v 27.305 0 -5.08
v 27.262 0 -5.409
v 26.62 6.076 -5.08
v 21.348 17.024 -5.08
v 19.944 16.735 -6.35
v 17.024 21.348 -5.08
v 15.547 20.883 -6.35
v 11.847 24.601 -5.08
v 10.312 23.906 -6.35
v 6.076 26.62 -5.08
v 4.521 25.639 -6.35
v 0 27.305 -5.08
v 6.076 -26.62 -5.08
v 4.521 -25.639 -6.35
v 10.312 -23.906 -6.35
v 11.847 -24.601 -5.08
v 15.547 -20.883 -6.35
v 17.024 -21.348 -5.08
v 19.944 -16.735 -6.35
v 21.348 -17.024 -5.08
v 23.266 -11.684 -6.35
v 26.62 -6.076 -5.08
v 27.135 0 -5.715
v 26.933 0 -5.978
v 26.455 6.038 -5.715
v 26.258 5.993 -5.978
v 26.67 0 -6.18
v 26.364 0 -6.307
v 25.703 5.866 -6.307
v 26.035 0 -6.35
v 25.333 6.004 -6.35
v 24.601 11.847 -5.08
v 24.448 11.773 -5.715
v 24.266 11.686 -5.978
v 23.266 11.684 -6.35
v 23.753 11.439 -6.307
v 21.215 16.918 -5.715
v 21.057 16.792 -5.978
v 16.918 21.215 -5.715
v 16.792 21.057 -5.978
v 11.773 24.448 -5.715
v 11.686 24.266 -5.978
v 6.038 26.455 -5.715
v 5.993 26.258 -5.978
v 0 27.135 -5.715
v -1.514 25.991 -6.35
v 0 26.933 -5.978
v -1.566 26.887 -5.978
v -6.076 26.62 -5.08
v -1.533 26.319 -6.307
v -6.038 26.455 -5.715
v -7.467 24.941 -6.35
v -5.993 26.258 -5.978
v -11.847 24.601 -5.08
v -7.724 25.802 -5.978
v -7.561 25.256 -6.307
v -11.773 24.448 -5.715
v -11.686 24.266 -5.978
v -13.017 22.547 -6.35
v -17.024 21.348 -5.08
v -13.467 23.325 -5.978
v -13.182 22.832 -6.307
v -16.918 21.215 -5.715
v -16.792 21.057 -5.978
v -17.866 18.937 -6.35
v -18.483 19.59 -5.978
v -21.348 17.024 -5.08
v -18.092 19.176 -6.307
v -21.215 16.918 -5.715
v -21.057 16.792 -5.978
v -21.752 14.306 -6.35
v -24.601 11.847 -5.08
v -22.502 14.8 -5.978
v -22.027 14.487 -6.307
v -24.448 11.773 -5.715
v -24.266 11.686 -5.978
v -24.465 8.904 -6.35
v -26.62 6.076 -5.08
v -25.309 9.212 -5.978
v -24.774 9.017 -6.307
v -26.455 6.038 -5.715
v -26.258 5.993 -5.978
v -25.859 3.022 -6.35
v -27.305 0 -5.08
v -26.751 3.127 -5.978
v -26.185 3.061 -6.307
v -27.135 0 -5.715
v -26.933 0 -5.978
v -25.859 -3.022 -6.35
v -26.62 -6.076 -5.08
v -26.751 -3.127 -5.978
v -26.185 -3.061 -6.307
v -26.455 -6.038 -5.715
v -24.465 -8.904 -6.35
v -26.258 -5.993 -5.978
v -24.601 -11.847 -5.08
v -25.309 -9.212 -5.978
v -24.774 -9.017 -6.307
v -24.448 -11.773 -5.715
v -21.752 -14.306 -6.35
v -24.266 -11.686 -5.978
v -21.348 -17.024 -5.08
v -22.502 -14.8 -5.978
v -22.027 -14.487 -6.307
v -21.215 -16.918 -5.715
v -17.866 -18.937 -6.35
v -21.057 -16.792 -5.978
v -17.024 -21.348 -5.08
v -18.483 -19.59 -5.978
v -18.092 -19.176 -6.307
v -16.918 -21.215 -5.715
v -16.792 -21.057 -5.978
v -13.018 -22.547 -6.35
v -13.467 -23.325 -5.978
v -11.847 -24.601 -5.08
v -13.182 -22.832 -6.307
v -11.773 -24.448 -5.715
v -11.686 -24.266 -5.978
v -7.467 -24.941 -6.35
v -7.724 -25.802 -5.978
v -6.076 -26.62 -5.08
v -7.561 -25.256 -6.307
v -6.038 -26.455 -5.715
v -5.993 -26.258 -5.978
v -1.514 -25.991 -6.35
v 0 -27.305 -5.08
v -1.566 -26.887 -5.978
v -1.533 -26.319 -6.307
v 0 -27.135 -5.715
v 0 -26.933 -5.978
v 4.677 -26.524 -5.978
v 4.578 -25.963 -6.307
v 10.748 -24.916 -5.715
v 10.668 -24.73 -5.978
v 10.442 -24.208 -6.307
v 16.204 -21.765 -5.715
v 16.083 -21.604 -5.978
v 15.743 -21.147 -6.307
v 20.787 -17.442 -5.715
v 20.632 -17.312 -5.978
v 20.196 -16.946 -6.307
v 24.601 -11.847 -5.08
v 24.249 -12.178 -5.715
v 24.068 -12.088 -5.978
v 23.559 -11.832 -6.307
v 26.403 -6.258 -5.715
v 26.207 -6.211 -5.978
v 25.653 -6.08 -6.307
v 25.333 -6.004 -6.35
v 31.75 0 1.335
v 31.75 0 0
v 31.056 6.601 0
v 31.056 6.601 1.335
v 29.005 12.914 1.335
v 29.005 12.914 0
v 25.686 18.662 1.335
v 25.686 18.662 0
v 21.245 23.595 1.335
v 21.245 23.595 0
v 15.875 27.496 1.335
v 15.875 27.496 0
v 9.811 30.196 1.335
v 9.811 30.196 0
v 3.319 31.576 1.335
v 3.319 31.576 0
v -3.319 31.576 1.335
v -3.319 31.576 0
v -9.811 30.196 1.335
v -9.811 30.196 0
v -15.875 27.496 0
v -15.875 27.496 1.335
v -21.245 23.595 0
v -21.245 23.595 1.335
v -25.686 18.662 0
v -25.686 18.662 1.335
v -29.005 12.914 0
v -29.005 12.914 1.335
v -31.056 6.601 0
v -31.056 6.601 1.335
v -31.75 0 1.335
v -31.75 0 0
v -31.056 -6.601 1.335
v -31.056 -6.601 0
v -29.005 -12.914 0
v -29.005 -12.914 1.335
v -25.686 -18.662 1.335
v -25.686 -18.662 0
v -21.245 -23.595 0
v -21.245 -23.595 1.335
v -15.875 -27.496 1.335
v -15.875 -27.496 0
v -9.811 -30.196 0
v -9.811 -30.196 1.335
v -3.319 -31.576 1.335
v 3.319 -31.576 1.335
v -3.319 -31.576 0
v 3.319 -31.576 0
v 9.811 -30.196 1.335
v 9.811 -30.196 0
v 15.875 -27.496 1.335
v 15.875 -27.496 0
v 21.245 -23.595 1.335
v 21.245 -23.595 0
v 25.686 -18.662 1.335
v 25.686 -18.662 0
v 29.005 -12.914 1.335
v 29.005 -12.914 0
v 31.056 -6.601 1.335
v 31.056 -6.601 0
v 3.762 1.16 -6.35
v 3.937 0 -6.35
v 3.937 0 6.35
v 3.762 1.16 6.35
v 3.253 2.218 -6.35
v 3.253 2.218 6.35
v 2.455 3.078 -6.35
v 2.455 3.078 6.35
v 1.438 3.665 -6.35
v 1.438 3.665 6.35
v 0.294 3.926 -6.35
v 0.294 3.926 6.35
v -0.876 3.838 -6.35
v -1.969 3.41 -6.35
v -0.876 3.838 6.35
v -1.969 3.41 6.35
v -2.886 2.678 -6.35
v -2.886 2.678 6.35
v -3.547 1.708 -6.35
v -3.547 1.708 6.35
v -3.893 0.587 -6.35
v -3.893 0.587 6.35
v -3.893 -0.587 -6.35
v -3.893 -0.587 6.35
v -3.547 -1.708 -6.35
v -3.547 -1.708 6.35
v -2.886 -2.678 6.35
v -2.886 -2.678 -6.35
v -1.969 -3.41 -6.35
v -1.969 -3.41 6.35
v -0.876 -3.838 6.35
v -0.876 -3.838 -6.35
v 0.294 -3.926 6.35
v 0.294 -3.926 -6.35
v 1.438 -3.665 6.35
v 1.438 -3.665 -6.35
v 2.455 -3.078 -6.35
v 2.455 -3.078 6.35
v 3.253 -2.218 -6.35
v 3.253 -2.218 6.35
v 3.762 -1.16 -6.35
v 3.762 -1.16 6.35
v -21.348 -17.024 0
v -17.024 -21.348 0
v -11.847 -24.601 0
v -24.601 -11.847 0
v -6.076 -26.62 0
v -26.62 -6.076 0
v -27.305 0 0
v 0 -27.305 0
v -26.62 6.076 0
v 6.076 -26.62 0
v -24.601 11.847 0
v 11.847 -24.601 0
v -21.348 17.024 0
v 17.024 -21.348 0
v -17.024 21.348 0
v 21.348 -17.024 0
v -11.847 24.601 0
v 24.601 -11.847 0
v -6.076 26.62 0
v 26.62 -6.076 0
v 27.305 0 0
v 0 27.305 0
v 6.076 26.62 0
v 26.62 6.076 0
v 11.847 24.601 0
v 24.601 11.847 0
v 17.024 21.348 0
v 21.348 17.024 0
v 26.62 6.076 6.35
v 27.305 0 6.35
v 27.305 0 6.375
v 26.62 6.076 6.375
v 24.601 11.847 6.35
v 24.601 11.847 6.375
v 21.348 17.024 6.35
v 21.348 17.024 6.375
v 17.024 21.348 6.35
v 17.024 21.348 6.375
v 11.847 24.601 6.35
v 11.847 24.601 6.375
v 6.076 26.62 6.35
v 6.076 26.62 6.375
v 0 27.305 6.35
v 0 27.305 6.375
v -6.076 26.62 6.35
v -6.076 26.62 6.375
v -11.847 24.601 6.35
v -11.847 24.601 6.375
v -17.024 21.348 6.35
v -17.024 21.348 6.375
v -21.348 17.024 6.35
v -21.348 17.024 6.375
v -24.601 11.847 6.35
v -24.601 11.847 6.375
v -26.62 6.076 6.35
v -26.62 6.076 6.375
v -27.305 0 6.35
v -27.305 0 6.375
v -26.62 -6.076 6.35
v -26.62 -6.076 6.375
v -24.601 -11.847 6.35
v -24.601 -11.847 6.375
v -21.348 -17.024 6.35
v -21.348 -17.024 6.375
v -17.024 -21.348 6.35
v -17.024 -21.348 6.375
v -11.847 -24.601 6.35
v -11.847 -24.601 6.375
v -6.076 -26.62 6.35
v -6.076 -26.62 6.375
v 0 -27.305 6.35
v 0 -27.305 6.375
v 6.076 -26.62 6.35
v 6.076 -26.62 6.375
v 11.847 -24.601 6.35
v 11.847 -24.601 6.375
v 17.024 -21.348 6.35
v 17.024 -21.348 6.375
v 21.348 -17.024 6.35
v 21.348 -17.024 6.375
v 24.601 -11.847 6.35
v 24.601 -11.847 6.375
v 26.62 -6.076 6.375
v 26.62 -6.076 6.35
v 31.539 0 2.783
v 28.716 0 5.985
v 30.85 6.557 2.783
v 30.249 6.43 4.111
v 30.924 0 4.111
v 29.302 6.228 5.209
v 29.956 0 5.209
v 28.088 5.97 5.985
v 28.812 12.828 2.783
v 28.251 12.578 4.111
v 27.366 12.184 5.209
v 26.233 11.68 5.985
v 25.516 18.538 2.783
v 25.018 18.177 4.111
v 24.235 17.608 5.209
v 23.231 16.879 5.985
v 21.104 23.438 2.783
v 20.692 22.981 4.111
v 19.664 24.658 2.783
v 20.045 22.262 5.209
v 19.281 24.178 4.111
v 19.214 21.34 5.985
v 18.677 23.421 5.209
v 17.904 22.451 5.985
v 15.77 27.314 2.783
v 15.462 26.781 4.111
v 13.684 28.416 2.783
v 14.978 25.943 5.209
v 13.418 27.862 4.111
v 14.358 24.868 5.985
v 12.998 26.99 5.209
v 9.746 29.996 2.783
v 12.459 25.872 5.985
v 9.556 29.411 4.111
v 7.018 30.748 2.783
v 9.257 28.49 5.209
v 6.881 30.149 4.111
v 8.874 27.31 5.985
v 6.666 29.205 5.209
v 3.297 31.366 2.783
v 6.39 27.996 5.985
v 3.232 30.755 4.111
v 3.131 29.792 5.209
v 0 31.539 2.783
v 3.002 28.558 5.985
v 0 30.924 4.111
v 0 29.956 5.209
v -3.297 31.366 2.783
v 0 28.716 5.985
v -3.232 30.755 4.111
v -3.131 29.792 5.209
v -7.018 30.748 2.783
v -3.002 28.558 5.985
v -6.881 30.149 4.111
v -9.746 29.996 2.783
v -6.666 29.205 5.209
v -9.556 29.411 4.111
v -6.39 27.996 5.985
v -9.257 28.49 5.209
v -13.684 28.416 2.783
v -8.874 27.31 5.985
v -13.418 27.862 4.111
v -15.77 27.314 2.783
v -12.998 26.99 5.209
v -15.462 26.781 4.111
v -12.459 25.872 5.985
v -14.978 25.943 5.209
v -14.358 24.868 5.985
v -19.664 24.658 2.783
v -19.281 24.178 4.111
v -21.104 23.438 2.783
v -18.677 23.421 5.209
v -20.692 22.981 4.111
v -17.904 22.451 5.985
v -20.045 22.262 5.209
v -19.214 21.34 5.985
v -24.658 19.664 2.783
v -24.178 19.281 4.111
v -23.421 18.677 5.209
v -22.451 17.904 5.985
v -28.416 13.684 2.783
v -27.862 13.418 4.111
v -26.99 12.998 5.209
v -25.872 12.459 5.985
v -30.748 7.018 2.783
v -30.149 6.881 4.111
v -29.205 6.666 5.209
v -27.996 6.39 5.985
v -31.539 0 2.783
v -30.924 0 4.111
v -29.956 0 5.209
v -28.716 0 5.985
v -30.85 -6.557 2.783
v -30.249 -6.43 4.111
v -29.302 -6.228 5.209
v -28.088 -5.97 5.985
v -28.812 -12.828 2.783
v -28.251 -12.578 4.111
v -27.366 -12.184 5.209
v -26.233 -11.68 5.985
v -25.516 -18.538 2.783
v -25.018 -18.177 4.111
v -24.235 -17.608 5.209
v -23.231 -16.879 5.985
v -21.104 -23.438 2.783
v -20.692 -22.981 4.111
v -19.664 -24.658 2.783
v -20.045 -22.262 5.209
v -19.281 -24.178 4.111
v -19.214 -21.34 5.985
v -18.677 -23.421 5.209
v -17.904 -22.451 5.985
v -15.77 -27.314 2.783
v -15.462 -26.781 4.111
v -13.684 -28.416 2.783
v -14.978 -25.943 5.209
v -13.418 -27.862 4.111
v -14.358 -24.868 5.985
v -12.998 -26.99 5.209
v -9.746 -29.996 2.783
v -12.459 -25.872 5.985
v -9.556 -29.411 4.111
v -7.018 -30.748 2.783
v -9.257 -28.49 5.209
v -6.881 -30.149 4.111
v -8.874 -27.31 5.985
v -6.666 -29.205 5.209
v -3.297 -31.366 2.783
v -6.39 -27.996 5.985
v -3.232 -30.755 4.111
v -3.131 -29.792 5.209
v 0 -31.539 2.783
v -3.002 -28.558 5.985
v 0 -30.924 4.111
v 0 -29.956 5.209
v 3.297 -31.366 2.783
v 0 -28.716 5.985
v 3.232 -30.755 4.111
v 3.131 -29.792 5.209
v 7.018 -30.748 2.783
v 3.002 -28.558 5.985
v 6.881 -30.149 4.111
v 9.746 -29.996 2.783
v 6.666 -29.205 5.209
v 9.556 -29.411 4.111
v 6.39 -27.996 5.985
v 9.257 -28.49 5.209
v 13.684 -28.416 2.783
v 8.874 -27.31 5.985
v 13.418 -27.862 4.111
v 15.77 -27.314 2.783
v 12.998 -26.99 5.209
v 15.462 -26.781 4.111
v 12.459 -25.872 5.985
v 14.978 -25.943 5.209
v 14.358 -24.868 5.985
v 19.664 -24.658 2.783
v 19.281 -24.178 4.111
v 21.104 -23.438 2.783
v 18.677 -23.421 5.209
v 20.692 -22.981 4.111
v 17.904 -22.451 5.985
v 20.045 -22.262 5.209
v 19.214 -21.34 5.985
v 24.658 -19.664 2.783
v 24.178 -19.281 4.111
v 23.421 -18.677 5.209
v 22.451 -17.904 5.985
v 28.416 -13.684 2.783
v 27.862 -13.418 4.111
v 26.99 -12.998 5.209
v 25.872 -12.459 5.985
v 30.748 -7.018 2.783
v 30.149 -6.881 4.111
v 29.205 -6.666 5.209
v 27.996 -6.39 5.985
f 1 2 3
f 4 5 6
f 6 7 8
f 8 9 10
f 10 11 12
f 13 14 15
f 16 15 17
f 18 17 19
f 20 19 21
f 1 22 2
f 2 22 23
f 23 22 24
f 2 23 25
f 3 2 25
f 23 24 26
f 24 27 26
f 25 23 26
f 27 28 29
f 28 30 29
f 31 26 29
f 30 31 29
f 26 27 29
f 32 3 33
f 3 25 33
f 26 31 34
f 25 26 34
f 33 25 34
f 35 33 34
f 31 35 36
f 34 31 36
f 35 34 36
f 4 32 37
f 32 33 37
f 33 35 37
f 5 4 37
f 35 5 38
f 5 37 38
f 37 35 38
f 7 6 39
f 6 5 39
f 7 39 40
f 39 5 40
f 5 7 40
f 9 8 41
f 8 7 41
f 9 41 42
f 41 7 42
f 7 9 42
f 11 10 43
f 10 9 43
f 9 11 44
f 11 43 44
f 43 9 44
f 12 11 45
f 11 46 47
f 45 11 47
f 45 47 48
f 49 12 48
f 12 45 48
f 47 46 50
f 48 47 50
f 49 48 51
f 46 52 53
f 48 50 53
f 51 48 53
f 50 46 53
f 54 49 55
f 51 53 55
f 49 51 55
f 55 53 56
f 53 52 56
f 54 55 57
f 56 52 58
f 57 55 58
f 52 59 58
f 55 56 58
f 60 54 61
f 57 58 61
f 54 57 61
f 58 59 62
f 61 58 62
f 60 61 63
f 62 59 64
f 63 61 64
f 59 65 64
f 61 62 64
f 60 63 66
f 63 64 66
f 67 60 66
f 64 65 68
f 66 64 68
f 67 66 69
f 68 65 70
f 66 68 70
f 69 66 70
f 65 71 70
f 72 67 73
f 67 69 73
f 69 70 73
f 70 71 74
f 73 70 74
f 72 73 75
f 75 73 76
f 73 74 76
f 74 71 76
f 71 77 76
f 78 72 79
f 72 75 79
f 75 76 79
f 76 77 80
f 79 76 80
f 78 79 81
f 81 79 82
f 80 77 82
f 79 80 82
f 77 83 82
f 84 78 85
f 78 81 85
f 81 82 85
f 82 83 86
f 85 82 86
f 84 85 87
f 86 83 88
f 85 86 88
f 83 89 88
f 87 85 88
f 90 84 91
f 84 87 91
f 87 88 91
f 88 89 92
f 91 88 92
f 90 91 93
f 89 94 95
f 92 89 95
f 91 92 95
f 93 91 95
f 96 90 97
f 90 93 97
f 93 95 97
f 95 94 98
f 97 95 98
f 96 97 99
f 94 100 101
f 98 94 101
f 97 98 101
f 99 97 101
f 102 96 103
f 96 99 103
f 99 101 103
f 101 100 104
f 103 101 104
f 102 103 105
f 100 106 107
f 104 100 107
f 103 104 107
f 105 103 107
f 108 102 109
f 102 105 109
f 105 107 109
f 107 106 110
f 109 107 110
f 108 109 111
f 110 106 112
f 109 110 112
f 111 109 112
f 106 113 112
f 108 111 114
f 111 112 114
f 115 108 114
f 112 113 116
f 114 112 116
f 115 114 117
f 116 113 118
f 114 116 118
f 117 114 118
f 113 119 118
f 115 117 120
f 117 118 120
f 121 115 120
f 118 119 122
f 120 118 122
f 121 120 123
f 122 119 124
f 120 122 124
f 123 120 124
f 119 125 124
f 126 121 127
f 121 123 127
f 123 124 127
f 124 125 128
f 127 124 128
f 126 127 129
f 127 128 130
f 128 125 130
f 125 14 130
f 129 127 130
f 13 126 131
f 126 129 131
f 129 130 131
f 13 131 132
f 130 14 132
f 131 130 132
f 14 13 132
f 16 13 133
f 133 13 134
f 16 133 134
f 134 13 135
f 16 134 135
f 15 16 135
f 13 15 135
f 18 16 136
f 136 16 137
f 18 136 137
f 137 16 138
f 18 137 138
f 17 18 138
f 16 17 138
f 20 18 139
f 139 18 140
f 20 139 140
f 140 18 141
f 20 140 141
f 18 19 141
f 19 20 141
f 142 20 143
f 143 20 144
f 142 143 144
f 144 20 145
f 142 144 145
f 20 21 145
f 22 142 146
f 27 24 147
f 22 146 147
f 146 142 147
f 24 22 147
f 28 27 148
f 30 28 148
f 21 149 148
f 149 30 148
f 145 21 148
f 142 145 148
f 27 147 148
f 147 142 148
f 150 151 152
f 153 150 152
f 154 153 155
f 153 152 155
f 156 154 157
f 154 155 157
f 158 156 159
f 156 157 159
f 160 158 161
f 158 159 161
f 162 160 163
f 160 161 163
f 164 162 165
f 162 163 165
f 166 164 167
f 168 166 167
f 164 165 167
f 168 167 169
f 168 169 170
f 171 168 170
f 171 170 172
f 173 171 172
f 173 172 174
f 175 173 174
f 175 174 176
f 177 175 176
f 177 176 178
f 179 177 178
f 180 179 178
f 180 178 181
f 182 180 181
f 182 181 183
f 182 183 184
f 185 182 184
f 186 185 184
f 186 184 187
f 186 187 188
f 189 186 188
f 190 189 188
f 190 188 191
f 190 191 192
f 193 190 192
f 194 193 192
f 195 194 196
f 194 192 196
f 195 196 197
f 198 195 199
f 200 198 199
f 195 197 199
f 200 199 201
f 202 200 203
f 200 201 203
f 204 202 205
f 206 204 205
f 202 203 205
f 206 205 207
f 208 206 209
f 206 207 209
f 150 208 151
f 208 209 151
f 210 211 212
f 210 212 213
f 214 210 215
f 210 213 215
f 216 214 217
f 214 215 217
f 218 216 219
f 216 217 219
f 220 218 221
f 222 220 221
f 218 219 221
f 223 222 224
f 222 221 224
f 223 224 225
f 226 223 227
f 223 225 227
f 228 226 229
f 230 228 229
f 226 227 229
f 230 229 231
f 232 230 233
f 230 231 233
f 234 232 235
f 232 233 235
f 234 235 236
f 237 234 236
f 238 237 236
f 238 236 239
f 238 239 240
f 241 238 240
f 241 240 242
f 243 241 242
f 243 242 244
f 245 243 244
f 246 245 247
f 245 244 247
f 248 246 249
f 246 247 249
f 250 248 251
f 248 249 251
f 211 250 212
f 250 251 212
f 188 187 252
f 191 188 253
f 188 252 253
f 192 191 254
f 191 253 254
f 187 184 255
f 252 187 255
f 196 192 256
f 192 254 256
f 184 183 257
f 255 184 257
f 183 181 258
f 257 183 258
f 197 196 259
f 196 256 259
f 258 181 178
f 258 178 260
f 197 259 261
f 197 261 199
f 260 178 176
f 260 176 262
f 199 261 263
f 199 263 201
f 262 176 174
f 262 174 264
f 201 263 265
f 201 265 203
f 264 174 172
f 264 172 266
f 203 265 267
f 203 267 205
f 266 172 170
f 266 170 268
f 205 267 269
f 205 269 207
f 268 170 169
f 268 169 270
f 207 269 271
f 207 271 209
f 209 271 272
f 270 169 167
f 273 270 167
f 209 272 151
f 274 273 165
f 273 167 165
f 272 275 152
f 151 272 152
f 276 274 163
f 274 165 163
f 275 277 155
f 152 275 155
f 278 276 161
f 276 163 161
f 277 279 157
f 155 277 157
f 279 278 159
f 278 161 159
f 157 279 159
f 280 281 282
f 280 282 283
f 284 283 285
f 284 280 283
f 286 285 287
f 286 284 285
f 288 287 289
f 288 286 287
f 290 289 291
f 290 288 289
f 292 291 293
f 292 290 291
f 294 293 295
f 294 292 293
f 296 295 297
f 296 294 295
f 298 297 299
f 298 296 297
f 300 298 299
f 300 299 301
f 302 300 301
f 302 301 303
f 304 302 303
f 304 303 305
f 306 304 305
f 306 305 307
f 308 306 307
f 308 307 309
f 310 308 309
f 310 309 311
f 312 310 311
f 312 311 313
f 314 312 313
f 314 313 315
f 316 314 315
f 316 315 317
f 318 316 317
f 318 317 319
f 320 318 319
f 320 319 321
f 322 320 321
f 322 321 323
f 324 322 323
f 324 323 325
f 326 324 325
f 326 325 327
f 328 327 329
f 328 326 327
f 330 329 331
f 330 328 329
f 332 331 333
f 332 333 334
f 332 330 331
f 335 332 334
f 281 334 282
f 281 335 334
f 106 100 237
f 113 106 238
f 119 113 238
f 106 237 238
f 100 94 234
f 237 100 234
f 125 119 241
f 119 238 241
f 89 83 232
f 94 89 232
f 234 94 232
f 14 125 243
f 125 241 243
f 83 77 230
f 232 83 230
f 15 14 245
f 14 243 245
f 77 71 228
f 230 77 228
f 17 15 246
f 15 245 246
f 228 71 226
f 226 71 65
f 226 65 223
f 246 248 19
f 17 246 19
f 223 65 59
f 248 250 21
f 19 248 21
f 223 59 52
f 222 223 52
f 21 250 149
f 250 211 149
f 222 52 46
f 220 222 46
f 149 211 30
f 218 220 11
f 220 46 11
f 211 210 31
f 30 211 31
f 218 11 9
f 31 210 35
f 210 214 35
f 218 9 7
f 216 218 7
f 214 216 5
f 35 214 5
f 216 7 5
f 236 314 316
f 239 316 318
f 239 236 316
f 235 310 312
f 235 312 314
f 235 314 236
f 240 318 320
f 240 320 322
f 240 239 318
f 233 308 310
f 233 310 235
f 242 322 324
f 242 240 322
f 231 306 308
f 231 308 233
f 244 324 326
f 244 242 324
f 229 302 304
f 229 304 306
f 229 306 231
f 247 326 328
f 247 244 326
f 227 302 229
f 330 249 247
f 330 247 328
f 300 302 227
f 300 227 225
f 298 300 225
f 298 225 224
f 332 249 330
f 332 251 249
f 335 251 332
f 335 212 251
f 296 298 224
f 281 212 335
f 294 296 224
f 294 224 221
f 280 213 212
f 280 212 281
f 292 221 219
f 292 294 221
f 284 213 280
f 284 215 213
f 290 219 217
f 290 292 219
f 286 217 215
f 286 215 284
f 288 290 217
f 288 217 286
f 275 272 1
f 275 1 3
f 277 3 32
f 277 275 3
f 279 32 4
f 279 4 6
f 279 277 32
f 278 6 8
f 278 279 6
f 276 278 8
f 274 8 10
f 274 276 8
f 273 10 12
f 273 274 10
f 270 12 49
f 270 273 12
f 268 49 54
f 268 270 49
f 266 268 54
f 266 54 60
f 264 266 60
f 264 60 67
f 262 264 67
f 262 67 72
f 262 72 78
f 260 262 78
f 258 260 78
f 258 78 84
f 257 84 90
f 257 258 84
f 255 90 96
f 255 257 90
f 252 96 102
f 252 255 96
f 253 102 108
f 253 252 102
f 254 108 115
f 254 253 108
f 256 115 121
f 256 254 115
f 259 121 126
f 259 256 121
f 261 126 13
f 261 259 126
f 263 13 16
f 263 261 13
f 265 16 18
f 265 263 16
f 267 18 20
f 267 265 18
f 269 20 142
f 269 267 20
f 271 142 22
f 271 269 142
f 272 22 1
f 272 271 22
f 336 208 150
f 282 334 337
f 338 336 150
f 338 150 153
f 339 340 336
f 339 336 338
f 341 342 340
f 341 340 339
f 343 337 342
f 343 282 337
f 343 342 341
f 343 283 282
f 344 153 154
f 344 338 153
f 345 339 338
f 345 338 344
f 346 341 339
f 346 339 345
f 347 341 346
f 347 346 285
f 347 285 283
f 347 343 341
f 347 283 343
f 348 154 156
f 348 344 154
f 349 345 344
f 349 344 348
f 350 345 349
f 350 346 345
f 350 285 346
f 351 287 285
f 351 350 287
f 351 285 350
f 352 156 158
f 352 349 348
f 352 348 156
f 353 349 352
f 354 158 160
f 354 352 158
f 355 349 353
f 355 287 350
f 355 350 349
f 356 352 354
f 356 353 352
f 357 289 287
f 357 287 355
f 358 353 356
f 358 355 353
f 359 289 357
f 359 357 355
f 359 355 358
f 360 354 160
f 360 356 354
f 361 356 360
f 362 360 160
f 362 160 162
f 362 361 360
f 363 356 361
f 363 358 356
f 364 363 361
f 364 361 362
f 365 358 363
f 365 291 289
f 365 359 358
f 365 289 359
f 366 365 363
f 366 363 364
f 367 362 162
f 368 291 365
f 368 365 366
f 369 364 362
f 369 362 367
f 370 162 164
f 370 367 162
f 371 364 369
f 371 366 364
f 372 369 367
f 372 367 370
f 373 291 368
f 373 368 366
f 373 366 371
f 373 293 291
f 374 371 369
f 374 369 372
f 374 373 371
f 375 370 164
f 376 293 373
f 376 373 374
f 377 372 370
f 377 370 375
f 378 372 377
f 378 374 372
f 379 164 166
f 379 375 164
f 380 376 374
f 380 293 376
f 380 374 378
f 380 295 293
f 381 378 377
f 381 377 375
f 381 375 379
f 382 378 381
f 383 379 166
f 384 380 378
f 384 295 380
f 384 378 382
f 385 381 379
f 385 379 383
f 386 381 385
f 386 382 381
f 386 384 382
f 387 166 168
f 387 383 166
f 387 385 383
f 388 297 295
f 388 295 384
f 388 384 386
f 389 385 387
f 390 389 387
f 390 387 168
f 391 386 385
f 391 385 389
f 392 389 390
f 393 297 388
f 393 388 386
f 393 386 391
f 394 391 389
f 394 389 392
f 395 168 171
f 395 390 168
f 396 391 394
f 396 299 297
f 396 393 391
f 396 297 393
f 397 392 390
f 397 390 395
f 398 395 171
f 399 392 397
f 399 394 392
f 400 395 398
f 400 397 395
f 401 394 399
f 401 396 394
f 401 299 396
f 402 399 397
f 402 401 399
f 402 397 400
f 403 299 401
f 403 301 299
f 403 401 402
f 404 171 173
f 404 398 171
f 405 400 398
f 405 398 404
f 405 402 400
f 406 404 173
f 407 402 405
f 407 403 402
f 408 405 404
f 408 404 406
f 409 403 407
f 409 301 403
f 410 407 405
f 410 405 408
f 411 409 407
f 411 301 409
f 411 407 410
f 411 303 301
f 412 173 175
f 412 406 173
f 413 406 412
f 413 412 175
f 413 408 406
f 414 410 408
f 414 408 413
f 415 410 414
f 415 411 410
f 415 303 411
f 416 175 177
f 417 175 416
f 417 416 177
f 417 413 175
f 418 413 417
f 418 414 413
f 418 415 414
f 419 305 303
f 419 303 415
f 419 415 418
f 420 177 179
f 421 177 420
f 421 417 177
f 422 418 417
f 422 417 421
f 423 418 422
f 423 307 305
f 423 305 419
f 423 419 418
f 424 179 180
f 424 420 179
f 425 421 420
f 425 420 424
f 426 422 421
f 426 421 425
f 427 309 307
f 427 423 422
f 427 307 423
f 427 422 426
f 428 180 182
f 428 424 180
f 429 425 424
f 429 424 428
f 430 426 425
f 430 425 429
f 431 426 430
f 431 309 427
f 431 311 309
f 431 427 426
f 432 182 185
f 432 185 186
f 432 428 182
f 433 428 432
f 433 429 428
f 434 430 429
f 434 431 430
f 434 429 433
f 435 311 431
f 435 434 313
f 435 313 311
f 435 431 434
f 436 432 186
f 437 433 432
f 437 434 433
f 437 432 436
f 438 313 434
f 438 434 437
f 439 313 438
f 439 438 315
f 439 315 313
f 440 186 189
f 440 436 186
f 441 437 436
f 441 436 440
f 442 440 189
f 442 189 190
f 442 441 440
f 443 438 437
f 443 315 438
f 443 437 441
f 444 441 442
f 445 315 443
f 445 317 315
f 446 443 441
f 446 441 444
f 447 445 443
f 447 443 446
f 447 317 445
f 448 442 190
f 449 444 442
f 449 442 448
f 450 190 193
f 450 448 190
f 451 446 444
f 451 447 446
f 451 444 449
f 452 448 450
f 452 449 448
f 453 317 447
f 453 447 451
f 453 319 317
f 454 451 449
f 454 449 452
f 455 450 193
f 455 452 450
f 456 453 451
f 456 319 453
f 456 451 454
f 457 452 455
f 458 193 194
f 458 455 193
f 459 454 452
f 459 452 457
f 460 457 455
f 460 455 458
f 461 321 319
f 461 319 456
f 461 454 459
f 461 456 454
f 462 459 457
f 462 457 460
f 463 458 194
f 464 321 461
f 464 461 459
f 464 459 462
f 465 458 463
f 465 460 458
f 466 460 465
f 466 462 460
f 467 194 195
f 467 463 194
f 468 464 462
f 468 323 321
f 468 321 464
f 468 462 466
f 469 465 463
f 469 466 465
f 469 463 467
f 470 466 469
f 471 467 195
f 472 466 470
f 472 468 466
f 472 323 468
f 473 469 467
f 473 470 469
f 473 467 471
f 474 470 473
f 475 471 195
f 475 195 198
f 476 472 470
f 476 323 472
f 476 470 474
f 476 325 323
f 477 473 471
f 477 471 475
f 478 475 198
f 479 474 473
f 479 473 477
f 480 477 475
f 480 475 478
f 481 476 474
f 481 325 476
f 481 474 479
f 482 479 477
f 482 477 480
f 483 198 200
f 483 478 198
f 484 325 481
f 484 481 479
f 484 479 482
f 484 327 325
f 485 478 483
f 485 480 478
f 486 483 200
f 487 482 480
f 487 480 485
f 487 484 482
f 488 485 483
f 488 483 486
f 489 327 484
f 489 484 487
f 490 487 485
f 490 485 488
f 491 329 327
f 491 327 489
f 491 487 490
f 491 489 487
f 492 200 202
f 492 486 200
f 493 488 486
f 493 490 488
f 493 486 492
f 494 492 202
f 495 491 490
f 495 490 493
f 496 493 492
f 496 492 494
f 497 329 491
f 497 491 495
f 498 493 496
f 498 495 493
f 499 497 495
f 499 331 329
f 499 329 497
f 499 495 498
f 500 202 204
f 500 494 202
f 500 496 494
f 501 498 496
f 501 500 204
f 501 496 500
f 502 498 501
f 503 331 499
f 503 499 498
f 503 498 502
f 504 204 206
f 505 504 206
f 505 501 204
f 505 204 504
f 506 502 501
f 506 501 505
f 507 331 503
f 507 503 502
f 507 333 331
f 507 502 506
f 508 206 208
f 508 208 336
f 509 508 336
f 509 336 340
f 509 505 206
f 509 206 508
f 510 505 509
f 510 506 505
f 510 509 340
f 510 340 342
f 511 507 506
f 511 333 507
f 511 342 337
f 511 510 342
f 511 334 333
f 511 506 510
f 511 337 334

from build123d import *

# Parameters (mm, degrees)
F0_R     = 27.305
F1_DEPTH = 6.35
F2_R     = 3.937
F3_DEPTH = 12.7
F0_R_2   = 31.75
F4_DEPTH = 6.3754
F5_R     = 1.27


# Not quite as in the source:
# - a fillet or chamfer that OpenCascade refuses, or shapes differently, is made with other operations: its cross-section is extruded or revolved along the edge and cut away or added


with BuildPart() as f1:
    # F0 (on Top) → F1 (new body, symmetric)
    with BuildSketch(Plane.XY):
        Circle(F0_R)
    extrude(amount=F1_DEPTH, both=True)

    # F2 (on Top) → F3 (cut, symmetric)
    with BuildSketch(Plane.XY):
        Circle(F2_R)
    extrude(amount=F3_DEPTH, both=True, mode=Mode.SUBTRACT)

    # F0 (on Top) → F4 (join)
    with BuildSketch(Plane.XY):
        Circle(F0_R_2)
        Circle(F0_R, mode=Mode.SUBTRACT)
    extrude(amount=F4_DEPTH)

    # F5
    f5_edges = [f1.edges().sort_by_distance(p)[0] for p in [
        (-27.305, 0, -6.35),
    ]]
    fillet(f5_edges, radius=F5_R)

    # F6: fillet of radius 5.08 on 1 edges, made by hand

    # F6_s1 → F6_t2 (revolve, cut)
    with BuildSketch(Plane.XZ):
        with BuildLine():
            ThreePointArc((31.75, 1.3352437524), (30.48, 4.6953479175), (27.305, 6.3754))
            Line((27.305, 6.3754), (31.75, 6.3754))
            Line((31.75, 6.3754), (31.75, 1.3352437524))
        make_face()
    revolve(axis=Axis((0, 0, 6.3754), (0, 0, 1)), mode=Mode.SUBTRACT)


solid = f1.part
